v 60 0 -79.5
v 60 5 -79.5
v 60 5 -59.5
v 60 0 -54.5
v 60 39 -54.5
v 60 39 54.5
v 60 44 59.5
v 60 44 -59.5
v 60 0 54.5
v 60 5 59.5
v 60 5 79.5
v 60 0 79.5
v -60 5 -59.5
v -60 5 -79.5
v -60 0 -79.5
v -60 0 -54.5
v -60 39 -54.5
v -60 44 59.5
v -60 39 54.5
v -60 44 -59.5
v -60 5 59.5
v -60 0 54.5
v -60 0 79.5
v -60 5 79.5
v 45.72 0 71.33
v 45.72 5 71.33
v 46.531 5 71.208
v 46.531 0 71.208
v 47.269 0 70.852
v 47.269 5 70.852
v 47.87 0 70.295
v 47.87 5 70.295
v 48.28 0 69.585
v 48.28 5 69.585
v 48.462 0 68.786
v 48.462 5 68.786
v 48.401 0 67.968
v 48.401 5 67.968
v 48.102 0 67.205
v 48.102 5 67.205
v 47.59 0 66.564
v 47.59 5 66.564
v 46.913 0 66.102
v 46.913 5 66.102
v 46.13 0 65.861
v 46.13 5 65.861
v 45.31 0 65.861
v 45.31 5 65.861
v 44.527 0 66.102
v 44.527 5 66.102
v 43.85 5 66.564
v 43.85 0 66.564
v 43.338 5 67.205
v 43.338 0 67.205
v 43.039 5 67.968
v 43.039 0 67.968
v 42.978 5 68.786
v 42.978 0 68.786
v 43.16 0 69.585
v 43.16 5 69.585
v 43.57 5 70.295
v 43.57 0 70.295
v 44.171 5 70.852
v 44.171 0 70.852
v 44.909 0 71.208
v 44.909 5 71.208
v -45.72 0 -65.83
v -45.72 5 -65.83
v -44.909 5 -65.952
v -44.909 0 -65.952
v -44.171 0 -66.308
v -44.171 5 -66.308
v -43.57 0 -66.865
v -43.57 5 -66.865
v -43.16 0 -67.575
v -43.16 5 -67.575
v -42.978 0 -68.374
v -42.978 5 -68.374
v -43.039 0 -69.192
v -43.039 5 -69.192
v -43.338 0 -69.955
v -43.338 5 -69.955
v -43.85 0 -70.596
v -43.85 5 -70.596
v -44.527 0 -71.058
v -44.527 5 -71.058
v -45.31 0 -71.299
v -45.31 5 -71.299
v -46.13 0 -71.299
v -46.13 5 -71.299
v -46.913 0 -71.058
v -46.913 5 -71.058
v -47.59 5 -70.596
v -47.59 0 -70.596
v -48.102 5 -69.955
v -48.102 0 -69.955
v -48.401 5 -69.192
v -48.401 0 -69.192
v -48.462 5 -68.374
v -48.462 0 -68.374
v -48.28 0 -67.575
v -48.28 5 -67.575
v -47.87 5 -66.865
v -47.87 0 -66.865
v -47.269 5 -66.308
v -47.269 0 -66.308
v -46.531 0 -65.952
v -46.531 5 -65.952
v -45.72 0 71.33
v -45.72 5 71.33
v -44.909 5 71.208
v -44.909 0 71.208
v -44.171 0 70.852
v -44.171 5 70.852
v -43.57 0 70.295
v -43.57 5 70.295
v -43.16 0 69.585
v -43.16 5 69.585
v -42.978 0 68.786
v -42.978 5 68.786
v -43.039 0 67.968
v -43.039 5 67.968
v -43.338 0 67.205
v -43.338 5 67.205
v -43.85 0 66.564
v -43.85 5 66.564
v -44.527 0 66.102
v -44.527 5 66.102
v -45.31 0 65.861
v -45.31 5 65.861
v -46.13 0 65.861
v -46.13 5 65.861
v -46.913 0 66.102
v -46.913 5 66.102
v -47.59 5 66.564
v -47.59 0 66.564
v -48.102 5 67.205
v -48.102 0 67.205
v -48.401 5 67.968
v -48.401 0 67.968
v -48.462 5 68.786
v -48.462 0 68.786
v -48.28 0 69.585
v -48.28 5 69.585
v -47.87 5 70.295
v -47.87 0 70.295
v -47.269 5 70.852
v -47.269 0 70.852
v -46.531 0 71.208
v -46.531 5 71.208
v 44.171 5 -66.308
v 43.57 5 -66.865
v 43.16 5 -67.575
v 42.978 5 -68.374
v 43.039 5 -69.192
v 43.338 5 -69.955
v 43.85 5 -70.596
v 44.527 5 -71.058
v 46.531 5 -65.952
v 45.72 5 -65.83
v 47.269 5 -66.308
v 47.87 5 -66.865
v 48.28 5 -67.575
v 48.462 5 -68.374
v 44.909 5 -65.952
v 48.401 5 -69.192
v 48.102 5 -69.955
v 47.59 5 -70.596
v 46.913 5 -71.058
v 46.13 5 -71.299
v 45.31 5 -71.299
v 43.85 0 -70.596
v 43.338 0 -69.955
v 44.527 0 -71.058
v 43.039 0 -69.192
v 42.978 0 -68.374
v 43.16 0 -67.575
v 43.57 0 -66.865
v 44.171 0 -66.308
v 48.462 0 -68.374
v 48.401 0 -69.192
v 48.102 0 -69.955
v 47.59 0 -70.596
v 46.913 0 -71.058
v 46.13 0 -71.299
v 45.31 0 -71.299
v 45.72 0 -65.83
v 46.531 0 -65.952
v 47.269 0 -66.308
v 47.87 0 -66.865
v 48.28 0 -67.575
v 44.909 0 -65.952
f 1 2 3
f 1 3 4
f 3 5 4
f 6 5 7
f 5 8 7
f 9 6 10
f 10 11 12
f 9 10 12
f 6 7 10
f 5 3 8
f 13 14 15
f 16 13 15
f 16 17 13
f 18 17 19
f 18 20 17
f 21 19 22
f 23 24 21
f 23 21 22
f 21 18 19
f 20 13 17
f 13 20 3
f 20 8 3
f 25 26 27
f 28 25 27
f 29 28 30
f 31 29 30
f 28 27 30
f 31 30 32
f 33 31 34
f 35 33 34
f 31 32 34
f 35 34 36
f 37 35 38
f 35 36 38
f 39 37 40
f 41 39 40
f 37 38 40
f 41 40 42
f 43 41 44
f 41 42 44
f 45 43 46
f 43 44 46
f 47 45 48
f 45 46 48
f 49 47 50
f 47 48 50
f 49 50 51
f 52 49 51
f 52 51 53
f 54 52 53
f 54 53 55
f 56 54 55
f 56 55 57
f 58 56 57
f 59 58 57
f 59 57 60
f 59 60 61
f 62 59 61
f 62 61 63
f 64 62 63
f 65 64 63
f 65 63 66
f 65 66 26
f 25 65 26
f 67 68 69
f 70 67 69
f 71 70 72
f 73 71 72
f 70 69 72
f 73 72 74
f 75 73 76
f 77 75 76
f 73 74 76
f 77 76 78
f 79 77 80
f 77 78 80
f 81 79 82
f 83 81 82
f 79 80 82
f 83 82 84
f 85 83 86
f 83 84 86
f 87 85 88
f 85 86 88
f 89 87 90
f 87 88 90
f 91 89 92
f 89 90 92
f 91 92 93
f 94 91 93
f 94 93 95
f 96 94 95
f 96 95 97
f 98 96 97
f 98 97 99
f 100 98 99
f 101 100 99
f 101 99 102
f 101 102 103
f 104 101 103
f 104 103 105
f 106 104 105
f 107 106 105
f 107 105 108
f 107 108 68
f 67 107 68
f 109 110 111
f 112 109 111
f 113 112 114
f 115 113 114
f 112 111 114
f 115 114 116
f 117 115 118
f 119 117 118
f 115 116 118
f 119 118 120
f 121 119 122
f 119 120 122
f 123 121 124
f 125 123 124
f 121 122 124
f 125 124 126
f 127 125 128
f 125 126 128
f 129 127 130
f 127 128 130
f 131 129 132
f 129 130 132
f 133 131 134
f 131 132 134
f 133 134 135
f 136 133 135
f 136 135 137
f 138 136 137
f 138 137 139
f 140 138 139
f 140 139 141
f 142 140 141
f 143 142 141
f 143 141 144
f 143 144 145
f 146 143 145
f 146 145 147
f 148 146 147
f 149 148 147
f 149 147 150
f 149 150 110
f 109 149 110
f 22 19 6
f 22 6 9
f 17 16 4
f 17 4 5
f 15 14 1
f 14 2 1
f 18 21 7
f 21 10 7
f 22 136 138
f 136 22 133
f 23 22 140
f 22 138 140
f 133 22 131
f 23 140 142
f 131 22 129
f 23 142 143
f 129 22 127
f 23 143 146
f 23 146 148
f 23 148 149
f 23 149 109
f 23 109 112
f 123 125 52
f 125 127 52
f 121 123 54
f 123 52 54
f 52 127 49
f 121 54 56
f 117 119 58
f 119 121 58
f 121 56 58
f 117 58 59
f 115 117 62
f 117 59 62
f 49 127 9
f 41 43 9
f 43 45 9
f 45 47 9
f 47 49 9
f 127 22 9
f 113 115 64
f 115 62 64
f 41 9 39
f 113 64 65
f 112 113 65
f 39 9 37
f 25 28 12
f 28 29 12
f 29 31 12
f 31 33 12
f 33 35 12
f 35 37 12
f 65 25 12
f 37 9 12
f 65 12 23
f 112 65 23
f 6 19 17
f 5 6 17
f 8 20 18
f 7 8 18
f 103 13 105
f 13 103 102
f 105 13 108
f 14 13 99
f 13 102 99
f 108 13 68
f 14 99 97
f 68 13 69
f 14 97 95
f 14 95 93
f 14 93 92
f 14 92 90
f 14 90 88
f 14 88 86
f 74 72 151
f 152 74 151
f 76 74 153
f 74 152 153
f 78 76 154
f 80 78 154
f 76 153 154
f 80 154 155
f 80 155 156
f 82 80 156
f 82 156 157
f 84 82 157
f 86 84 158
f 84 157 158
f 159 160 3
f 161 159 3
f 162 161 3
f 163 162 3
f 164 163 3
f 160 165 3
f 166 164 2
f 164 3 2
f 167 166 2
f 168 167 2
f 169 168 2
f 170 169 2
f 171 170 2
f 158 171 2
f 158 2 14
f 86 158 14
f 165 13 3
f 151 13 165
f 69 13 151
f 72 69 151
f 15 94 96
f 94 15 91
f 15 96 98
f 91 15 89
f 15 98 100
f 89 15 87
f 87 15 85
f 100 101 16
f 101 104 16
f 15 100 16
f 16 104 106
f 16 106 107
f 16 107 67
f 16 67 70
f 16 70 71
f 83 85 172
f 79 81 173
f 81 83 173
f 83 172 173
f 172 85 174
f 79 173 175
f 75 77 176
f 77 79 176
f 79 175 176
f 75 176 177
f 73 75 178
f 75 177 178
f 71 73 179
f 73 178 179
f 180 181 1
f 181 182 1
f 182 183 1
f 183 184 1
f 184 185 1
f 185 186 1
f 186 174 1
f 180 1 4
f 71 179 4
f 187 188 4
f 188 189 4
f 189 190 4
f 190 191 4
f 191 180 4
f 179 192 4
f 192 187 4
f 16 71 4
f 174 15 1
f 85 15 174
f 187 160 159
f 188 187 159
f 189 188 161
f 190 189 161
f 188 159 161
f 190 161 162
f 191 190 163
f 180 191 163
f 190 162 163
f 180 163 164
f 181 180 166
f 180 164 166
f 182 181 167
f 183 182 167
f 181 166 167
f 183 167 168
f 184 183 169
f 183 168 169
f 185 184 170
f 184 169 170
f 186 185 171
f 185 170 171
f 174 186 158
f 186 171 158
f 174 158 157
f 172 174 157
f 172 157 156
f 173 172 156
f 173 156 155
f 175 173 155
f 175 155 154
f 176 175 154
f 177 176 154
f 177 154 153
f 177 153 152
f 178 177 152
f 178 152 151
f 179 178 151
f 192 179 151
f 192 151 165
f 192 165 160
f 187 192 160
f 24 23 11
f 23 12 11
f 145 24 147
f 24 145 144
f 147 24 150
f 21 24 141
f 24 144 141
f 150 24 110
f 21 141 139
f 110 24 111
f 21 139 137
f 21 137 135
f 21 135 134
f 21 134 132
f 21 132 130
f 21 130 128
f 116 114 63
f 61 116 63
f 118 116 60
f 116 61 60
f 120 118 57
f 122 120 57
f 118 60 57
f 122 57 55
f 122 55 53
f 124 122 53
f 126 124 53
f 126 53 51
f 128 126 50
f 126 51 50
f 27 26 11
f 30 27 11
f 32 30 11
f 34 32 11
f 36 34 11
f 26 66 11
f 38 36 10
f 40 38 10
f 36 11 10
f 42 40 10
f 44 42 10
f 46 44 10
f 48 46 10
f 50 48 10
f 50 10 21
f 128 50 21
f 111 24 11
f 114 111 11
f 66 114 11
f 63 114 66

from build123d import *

# Parameters (mm, degrees)
BOSS_EXTRUDE1_DEPTH = 60
SKETCH2_R           = 2.75
CUT_EXTRUDE1_DEPTH  = 107.963778916


with BuildPart() as part:
    # Sketch1 → Boss-Extrude1 (new, symmetric)
    with BuildSketch(Plane.YZ):
        Polygon((39, 0), (39, 54.5), (0, 54.5), (0, 79.5), (5, 79.5), (5, 59.5), (44, 59.5), (44, 0), (44, -59.5), (5, -59.5), (5, -79.5), (0, -79.5), (0, -54.5), (39, -54.5), align=None)
    extrude(amount=BOSS_EXTRUDE1_DEPTH, both=True)

    # Sketch2 → Cut-Extrude1 (cut, through all)
    with BuildSketch(Plane(origin=(0, 5, 0), x_dir=(-1, 0, 0), z_dir=(0, 1, 0))):
        with Locations(Location((-45.72, 68.58, 0), (0, 0, 90))):
            Circle(SKETCH2_R)
        with Locations(Location((45.72, 68.58, 0), (0, 0, 90))):
            Circle(SKETCH2_R)
        with Locations(Location((45.72, -68.58, 0), (0, 0, 90))):
            Circle(SKETCH2_R)
        with Locations(Location((-45.72, -68.58, 0), (0, 0, 90))):
            Circle(SKETCH2_R)
    extrude(amount=-CUT_EXTRUDE1_DEPTH, mode=Mode.SUBTRACT)


solid = part.part
